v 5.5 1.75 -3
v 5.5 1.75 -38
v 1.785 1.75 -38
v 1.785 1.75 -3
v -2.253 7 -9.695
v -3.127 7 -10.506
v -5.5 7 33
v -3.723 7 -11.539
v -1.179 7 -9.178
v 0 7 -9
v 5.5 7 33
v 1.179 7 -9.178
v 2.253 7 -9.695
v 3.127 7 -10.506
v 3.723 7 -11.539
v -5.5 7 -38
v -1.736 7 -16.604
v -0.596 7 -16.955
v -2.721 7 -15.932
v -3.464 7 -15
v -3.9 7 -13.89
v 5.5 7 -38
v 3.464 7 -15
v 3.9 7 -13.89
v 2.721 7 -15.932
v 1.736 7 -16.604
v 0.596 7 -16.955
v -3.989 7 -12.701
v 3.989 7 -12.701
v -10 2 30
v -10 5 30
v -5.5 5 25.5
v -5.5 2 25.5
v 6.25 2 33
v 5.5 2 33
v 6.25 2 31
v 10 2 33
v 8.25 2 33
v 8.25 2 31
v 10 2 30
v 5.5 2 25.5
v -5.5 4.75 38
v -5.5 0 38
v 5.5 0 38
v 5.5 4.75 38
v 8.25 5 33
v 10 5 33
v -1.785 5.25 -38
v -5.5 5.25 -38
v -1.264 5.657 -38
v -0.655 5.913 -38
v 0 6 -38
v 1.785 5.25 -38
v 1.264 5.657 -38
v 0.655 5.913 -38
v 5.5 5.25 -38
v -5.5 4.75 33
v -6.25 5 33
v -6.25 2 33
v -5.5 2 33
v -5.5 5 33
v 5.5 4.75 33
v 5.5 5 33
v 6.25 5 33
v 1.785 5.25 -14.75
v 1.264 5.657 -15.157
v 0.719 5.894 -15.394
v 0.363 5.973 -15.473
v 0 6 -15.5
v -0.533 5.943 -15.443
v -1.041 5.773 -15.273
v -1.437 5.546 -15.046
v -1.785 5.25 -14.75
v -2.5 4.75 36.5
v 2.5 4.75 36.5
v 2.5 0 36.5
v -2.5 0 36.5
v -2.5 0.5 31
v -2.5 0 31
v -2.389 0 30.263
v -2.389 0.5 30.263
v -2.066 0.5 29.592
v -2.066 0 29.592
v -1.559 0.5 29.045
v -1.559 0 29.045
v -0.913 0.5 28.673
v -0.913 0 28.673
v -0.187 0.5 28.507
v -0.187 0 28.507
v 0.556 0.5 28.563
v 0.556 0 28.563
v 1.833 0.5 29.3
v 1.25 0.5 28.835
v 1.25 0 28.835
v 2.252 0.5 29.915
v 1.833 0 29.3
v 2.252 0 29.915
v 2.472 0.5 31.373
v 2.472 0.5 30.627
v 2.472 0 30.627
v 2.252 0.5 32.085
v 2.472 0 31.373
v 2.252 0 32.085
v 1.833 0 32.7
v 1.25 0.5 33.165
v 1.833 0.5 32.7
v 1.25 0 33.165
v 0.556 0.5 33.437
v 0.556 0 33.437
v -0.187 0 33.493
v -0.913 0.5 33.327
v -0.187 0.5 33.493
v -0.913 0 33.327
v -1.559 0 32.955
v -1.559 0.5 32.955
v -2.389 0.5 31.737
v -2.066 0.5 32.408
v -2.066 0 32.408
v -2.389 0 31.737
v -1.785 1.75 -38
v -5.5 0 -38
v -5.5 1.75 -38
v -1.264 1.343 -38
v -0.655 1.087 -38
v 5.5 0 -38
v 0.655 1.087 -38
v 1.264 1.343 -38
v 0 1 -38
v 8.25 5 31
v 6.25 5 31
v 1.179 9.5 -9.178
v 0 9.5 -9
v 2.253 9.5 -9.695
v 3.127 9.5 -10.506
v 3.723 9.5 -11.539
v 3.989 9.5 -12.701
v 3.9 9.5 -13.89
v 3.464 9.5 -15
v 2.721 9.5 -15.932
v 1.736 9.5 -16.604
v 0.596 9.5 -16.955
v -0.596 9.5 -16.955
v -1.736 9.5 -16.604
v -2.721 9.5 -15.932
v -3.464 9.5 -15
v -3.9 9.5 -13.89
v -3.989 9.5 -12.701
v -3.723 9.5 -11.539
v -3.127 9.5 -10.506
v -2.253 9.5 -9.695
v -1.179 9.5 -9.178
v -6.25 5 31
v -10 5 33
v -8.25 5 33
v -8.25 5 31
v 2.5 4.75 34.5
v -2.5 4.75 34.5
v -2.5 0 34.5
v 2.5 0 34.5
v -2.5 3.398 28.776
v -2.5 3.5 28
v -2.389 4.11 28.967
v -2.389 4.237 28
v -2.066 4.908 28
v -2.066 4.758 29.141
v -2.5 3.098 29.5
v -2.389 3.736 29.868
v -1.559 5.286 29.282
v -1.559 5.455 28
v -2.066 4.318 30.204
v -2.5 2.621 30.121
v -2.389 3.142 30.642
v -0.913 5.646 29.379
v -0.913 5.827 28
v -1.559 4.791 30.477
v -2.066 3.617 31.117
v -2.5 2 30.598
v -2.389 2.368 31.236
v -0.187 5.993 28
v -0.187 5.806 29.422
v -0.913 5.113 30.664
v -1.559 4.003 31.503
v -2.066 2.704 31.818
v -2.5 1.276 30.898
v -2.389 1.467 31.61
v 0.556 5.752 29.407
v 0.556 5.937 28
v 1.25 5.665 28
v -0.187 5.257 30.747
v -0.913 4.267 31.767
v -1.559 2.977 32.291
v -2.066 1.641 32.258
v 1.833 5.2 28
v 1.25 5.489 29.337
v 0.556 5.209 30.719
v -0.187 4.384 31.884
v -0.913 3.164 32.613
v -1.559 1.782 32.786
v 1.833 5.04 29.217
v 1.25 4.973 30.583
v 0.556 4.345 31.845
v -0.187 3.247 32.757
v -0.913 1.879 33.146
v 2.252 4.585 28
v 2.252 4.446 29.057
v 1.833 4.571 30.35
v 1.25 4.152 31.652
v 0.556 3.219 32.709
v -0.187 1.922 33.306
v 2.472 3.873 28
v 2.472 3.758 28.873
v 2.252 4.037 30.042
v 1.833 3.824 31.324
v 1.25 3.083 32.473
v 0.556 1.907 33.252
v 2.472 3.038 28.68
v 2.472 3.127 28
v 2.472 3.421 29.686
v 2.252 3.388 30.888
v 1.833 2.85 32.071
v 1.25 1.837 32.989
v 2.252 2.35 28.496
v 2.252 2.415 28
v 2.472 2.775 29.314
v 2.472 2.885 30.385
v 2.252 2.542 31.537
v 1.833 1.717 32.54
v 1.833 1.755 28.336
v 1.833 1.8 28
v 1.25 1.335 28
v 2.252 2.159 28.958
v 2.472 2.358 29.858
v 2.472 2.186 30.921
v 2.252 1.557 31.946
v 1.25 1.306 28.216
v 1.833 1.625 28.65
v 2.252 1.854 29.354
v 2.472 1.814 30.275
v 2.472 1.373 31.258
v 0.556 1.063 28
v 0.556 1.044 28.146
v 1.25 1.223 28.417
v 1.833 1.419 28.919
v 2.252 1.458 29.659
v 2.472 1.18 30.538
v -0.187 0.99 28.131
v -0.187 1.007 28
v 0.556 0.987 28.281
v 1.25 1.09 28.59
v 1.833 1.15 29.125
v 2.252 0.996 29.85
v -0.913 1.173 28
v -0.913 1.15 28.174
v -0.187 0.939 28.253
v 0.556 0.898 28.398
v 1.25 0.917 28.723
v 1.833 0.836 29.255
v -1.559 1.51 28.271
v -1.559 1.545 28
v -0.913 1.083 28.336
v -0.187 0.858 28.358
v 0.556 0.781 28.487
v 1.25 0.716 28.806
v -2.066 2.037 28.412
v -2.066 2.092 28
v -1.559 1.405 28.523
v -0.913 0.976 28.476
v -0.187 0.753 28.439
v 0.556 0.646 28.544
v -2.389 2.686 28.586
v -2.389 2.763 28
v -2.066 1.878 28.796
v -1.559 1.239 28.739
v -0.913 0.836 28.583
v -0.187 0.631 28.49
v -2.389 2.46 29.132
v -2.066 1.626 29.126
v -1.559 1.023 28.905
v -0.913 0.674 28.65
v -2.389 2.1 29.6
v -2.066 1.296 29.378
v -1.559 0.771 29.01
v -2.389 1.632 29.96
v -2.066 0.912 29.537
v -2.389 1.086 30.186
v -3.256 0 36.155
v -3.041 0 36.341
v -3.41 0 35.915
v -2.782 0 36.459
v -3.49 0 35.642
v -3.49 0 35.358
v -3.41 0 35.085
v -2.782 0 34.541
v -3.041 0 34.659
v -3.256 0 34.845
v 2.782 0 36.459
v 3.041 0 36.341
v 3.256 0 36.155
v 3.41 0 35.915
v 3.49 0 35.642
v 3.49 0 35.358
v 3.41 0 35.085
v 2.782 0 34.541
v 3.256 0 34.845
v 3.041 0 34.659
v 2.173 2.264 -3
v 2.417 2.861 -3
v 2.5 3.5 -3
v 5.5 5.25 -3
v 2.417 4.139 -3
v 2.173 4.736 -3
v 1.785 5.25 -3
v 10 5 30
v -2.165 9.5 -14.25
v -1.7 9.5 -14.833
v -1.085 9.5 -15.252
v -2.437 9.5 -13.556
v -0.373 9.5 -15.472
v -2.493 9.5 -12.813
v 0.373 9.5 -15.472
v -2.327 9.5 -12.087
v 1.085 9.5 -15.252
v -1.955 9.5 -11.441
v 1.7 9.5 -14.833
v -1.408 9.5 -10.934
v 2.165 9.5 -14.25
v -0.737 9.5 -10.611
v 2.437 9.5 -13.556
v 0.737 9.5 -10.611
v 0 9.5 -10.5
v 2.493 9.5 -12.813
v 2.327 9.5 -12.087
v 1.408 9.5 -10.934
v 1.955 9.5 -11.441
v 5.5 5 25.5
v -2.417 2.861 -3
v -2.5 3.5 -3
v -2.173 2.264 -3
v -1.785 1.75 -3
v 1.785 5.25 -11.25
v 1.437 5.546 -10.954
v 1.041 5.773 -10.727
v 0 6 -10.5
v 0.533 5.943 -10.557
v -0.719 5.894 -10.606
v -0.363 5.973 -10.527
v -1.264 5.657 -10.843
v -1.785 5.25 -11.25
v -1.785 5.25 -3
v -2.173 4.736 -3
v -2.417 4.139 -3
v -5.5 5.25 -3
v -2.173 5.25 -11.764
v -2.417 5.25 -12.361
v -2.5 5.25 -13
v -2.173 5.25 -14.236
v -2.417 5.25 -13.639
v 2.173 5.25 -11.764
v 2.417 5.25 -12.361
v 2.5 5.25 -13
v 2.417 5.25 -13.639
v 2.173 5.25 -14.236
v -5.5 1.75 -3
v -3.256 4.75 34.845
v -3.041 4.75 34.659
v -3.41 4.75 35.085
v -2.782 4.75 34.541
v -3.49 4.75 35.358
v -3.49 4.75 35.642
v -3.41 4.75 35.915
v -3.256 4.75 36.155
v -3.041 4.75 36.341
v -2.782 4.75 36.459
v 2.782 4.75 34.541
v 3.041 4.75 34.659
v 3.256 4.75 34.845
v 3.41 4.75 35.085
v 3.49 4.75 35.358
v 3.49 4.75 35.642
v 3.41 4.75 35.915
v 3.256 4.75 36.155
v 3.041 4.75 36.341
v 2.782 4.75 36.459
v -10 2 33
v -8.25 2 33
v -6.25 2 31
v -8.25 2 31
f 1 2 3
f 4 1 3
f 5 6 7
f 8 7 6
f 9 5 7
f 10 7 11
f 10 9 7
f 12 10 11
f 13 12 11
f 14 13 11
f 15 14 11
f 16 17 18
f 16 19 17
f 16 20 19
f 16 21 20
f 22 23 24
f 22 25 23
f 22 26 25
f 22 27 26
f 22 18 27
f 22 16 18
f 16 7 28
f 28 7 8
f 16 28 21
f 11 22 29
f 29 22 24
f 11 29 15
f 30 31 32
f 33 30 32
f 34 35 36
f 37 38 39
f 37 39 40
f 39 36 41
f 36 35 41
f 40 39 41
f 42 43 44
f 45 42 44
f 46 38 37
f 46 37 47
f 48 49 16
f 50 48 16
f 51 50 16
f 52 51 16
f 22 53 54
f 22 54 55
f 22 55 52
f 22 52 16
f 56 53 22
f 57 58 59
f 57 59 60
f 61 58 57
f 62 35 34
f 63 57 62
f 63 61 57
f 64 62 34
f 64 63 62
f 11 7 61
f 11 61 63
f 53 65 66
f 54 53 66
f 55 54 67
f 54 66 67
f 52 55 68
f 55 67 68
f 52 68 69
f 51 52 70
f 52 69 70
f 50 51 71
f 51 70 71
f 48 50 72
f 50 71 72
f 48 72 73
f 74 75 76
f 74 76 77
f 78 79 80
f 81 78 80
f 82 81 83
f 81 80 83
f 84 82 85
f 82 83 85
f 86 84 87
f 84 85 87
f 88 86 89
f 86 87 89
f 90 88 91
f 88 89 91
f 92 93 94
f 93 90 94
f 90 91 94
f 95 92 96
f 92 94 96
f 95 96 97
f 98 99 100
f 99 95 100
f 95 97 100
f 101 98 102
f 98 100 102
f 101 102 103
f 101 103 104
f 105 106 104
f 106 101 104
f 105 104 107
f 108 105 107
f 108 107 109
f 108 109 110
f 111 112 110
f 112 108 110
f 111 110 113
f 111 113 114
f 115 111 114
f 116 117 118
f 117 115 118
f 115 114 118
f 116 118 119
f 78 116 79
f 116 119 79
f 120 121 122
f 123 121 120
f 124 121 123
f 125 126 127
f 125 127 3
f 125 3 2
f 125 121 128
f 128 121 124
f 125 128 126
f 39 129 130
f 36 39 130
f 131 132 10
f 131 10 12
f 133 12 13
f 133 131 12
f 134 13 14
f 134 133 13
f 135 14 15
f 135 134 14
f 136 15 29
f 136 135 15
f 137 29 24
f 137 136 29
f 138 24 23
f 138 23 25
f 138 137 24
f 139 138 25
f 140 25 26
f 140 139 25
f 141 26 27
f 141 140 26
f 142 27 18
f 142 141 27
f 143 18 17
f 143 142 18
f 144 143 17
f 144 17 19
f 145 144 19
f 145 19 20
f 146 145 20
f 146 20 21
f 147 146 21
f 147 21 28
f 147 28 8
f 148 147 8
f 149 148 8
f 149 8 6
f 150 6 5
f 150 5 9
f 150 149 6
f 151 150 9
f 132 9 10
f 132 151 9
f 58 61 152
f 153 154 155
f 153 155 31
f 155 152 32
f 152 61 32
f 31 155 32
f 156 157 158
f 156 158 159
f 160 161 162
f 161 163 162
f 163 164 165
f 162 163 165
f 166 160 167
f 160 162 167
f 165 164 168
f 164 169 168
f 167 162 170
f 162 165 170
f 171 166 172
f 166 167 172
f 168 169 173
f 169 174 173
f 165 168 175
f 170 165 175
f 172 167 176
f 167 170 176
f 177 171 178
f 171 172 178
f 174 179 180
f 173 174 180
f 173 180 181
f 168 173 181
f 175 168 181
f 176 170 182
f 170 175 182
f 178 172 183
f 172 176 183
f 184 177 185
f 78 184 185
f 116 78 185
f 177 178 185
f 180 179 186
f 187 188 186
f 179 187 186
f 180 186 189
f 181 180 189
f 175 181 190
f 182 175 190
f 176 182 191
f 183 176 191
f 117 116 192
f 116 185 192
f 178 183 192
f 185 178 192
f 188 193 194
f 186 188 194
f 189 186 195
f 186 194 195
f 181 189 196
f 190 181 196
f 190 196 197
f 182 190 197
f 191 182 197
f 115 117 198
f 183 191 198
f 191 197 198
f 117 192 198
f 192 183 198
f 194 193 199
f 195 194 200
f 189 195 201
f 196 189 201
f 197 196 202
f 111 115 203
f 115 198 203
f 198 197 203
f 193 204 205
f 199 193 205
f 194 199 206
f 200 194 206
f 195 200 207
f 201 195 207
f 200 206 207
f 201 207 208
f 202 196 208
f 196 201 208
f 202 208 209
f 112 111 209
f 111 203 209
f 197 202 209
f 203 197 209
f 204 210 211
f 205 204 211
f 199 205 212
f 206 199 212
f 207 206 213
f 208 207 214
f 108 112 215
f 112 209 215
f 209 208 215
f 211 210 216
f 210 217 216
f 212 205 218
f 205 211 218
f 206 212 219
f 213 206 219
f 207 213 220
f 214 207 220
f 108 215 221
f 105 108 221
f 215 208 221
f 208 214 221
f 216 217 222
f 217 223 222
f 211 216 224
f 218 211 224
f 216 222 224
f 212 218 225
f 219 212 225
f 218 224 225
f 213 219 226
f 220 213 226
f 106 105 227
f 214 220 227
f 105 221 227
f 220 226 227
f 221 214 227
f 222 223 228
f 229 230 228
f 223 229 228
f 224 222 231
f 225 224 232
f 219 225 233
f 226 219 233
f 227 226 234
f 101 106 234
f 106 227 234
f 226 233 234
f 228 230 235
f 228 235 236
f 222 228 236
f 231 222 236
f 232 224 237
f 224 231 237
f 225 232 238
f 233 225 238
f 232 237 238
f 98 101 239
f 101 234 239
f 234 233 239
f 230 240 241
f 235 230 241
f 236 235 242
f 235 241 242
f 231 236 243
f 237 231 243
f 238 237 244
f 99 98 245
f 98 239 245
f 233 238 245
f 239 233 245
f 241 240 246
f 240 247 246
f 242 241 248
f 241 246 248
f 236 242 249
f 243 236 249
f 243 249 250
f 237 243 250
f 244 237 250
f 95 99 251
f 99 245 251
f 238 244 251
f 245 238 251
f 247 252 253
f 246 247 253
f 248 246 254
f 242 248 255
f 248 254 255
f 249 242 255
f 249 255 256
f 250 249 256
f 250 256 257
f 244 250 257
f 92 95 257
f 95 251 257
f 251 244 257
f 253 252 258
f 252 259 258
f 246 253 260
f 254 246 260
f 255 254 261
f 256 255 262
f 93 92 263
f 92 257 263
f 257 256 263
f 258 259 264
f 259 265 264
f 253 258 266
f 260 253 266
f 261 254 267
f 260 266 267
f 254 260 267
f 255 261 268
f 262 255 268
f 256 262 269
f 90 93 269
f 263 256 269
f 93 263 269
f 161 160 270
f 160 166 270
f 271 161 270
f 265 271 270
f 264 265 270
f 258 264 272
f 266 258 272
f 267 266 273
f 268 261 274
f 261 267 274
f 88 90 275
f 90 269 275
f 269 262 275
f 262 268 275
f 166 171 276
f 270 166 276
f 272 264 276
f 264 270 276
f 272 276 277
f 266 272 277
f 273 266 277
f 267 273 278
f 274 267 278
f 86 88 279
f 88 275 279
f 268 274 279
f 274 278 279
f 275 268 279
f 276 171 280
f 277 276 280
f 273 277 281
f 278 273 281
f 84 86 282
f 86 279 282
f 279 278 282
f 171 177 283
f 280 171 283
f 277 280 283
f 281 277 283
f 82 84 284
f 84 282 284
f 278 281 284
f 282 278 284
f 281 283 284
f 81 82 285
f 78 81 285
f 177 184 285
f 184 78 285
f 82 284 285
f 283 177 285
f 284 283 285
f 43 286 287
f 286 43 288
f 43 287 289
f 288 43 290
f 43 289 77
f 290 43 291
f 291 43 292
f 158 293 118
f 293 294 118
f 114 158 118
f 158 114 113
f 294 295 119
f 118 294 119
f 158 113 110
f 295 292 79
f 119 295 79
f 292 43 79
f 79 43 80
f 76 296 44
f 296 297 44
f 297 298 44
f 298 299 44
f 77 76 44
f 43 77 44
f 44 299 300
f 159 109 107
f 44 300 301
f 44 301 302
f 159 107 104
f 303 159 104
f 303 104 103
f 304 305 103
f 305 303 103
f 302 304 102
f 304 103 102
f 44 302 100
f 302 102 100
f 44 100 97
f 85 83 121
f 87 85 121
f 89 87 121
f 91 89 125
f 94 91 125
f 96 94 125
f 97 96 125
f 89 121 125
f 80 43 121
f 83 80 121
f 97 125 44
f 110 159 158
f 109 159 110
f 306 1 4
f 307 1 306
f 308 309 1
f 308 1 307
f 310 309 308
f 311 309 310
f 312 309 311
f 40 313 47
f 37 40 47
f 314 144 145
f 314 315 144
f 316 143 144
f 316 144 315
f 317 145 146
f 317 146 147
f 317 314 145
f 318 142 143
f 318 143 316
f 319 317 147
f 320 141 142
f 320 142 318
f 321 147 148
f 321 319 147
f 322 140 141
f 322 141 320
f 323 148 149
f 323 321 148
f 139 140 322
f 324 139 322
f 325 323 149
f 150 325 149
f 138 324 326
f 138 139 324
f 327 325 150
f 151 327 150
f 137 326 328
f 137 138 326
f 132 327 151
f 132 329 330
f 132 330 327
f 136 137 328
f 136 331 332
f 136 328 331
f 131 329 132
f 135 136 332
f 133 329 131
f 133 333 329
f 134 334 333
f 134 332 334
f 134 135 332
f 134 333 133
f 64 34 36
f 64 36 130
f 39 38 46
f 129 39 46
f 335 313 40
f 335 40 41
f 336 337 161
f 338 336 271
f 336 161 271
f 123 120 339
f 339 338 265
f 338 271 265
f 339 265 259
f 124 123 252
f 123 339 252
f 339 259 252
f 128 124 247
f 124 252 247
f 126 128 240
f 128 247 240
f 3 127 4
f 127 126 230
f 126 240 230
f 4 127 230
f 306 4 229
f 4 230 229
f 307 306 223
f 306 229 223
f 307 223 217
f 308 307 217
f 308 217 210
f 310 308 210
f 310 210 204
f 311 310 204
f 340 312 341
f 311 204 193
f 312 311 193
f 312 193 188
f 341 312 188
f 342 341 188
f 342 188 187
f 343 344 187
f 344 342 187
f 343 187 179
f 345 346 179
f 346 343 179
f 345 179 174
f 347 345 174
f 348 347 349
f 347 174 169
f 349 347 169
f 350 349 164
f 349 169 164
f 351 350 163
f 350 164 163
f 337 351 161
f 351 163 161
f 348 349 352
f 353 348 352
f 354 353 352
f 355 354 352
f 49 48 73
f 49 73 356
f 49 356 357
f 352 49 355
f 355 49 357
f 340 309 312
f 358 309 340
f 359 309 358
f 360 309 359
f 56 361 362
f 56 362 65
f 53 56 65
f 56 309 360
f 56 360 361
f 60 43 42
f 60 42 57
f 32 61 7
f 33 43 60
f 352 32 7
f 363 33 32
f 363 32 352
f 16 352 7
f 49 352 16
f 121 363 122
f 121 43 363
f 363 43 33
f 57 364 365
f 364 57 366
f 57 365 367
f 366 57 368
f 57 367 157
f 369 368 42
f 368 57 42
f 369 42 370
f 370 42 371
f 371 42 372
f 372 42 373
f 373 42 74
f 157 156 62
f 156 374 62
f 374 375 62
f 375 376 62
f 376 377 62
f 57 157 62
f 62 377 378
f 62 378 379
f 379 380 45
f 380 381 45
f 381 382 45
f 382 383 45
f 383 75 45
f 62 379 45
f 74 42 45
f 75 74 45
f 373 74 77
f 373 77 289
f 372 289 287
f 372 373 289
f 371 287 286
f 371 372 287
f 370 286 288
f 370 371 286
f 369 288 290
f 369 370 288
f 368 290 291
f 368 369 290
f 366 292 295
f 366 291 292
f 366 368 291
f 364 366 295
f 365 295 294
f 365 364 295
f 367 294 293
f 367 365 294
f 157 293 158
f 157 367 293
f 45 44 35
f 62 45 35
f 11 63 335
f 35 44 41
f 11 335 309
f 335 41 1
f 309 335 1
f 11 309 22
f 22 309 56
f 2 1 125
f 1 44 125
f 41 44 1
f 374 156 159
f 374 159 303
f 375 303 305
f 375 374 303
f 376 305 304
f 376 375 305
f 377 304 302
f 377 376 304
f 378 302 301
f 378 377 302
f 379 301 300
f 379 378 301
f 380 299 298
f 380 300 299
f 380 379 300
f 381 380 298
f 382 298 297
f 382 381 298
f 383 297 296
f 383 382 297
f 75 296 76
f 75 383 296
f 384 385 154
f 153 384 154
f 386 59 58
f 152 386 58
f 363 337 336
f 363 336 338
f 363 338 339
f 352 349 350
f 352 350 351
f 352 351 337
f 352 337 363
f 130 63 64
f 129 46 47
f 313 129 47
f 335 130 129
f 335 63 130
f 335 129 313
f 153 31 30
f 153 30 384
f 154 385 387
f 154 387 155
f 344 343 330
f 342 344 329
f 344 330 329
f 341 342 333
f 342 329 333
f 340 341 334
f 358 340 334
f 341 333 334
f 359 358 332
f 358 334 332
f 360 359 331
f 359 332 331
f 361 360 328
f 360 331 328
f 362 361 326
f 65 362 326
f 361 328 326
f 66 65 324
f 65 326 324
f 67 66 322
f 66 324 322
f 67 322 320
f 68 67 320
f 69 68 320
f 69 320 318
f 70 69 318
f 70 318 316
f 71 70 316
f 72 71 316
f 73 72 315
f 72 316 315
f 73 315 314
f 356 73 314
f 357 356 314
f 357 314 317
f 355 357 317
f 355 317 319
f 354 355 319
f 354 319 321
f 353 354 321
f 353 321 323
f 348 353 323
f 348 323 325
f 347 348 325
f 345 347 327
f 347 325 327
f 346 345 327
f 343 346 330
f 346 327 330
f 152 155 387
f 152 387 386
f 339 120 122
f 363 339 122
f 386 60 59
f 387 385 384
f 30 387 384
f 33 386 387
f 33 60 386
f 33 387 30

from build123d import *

# Parameters (mm, degrees)
SKETCH1_W           = 11
SKETCH1_H           = 76
BOSS_EXTRUDE1_DEPTH = 7
SKETCH4_R           = 2.5
SKETCH5_W           = 3
SKETCH5_H           = 3
BOSS_EXTRUDE2_DEPTH = 4.5
SKETCH6_W           = 2
SKETCH6_H           = 4
CUT_EXTRUDE2_DEPTH  = 2
BOSS_EXTRUDE3_DEPTH = 3
SKETCH10_W          = 11
SKETCH10_H          = 3.5
CUT_EXTRUDE5_DEPTH  = 35
CUT_EXTRUDE6_REACH  = 41.912
SKETCH11_R          = 2.5
SKETCH12_W          = 11
SKETCH12_H          = 2.25
CUT_EXTRUDE9_DEPTH  = 5
CUT_EXTRUDE10_REACH = 41.58
BOSS_EXTRUDE4_START = 2.5
SKETCH15_R          = 4
SKETCH15_R_2        = 2.5
BOSS_EXTRUDE4_DEPTH = 2.5


with BuildPart() as part:
    # Sketch1 → Boss-Extrude1 (new body)
    with BuildSketch(Plane(origin=(0, 0, 0), x_dir=(1, 0, 0), z_dir=(0, 1, 0))):
        Rectangle(SKETCH1_W, SKETCH1_H)
    extrude(amount=BOSS_EXTRUDE1_DEPTH)

    # Cut-Sweep2: sweep along a path in Sketch3
    with BuildLine(Plane.ZY) as cut_sweep2_path:
        Line((-38, 3.5), (28, 3.5))
        ThreePointArc((28, 3.5), (30.121320344, 2.621320344), (31, 0.5))
        Line((31, 0.5), (31, 0))
    # Sketch4 → Cut-Sweep2 (sweep, cut)
    with BuildSketch(Plane(origin=(0, 0, -38), x_dir=(-1, 0, 0), z_dir=(0, 0, -1))):
        with Locations((0, 3.5)):
            Circle(SKETCH4_R)
    sweep(path=cut_sweep2_path.line, mode=Mode.SUBTRACT)

    # Sketch5 → Boss-Extrude2 (add)
    with BuildSketch(Plane.ZY.offset(5.5)):
        with Locations((31.5, 3.5)):
            Rectangle(SKETCH5_W, SKETCH5_H)
    boss_extrude2 = extrude(amount=BOSS_EXTRUDE2_DEPTH)

    # Mirror1: Boss-Extrude2 across plane
    add(boss_extrude2.mirror(Plane.ZY))

    # Sketch6 → Cut-Extrude2 (cut)
    with BuildSketch(Plane.XY.offset(33)):
        with Locations((-7.25, 4)):
            Rectangle(SKETCH6_W, SKETCH6_H)
    cut_extrude2 = extrude(amount=-CUT_EXTRUDE2_DEPTH, mode=Mode.SUBTRACT)

    # Mirror2: Cut-Extrude2 across plane
    add(cut_extrude2.mirror(Plane.ZY), mode=Mode.SUBTRACT)

    # Sketch7 → Boss-Extrude3 (add)
    with BuildSketch(Plane(origin=(0, 5, 0), x_dir=(1, 0, 0), z_dir=(0, 1, 0))):
        Polygon((-10, -30), (-5.5, -25.5), (-5.5, -30), align=None)
    boss_extrude3 = extrude(amount=-BOSS_EXTRUDE3_DEPTH)

    # Mirror3: Boss-Extrude3 across plane
    add(boss_extrude3.mirror(Plane.ZY))

    # Sketch10 → Cut-Extrude5 (cut)
    with BuildSketch(Plane(origin=(0, 0, -38), x_dir=(-1, 0, 0), z_dir=(0, 0, -1))):
        with Locations((0, 3.5)):
            Rectangle(SKETCH10_W, SKETCH10_H)
    extrude(amount=-CUT_EXTRUDE5_DEPTH, mode=Mode.SUBTRACT)

    # Sketch11 → Cut-Extrude6 (cut, up to next)
    with BuildSketch(Plane(origin=(0, 7, 0), x_dir=(1, 0, 0), z_dir=(0, 1, 0)), mode=Mode.PRIVATE) as cut_extrude6_sk1:
        with Locations(Location((0, 13, 0), (0, 0, 270))):
            Circle(SKETCH11_R)
    cut_extrude6_tool1 = extrude(cut_extrude6_sk1.sketch, amount=-CUT_EXTRUDE6_REACH, mode=Mode.PRIVATE) & part.part
    add(cut_extrude6_tool1.solids().sort_by_distance((0, 7, -13))[0], mode=Mode.SUBTRACT)

    # Sketch12 → Cut-Extrude9 (cut)
    with BuildSketch(Plane.XY.offset(38)):
        with Locations((0, 5.875)):
            Rectangle(SKETCH12_W, SKETCH12_H)
    extrude(amount=-CUT_EXTRUDE9_DEPTH, mode=Mode.SUBTRACT)

    # Sketch14 → Cut-Extrude10 (cut, up to next)
    with BuildSketch(Plane(origin=(0, 4.75, 0), x_dir=(1, 0, 0), z_dir=(0, 1, 0)), mode=Mode.PRIVATE) as cut_extrude10_sk1:
        with BuildLine():
            Line((-2.5, -34.5), (2.5, -34.5))
            ThreePointArc((2.5, -34.5), (3.5, -35.5), (2.5, -36.5))
            Line((2.5, -36.5), (-2.5, -36.5))
            ThreePointArc((-2.5, -36.5), (-3.5, -35.5), (-2.5, -34.5))
        make_face()
    cut_extrude10_tool1 = extrude(cut_extrude10_sk1.sketch, amount=-CUT_EXTRUDE10_REACH, mode=Mode.PRIVATE) & part.part
    add(cut_extrude10_tool1.solids().sort_by_distance((0, 4.75, 35.5))[0], mode=Mode.SUBTRACT)

    # Sketch15 → Boss-Extrude4 (add)
    with BuildSketch(Plane(origin=(0, 7, 0), x_dir=(1, 0, 0), z_dir=(0, 1, 0)).offset(BOSS_EXTRUDE4_START)):
        with Locations(Location((0, 13, 0), (0, 0, 270))):
            Circle(SKETCH15_R)
        with Locations(Location((0, 13, 0), (0, 0, 270))):
            Circle(SKETCH15_R_2, mode=Mode.SUBTRACT)
    extrude(amount=-BOSS_EXTRUDE4_DEPTH)


solid = part.part
